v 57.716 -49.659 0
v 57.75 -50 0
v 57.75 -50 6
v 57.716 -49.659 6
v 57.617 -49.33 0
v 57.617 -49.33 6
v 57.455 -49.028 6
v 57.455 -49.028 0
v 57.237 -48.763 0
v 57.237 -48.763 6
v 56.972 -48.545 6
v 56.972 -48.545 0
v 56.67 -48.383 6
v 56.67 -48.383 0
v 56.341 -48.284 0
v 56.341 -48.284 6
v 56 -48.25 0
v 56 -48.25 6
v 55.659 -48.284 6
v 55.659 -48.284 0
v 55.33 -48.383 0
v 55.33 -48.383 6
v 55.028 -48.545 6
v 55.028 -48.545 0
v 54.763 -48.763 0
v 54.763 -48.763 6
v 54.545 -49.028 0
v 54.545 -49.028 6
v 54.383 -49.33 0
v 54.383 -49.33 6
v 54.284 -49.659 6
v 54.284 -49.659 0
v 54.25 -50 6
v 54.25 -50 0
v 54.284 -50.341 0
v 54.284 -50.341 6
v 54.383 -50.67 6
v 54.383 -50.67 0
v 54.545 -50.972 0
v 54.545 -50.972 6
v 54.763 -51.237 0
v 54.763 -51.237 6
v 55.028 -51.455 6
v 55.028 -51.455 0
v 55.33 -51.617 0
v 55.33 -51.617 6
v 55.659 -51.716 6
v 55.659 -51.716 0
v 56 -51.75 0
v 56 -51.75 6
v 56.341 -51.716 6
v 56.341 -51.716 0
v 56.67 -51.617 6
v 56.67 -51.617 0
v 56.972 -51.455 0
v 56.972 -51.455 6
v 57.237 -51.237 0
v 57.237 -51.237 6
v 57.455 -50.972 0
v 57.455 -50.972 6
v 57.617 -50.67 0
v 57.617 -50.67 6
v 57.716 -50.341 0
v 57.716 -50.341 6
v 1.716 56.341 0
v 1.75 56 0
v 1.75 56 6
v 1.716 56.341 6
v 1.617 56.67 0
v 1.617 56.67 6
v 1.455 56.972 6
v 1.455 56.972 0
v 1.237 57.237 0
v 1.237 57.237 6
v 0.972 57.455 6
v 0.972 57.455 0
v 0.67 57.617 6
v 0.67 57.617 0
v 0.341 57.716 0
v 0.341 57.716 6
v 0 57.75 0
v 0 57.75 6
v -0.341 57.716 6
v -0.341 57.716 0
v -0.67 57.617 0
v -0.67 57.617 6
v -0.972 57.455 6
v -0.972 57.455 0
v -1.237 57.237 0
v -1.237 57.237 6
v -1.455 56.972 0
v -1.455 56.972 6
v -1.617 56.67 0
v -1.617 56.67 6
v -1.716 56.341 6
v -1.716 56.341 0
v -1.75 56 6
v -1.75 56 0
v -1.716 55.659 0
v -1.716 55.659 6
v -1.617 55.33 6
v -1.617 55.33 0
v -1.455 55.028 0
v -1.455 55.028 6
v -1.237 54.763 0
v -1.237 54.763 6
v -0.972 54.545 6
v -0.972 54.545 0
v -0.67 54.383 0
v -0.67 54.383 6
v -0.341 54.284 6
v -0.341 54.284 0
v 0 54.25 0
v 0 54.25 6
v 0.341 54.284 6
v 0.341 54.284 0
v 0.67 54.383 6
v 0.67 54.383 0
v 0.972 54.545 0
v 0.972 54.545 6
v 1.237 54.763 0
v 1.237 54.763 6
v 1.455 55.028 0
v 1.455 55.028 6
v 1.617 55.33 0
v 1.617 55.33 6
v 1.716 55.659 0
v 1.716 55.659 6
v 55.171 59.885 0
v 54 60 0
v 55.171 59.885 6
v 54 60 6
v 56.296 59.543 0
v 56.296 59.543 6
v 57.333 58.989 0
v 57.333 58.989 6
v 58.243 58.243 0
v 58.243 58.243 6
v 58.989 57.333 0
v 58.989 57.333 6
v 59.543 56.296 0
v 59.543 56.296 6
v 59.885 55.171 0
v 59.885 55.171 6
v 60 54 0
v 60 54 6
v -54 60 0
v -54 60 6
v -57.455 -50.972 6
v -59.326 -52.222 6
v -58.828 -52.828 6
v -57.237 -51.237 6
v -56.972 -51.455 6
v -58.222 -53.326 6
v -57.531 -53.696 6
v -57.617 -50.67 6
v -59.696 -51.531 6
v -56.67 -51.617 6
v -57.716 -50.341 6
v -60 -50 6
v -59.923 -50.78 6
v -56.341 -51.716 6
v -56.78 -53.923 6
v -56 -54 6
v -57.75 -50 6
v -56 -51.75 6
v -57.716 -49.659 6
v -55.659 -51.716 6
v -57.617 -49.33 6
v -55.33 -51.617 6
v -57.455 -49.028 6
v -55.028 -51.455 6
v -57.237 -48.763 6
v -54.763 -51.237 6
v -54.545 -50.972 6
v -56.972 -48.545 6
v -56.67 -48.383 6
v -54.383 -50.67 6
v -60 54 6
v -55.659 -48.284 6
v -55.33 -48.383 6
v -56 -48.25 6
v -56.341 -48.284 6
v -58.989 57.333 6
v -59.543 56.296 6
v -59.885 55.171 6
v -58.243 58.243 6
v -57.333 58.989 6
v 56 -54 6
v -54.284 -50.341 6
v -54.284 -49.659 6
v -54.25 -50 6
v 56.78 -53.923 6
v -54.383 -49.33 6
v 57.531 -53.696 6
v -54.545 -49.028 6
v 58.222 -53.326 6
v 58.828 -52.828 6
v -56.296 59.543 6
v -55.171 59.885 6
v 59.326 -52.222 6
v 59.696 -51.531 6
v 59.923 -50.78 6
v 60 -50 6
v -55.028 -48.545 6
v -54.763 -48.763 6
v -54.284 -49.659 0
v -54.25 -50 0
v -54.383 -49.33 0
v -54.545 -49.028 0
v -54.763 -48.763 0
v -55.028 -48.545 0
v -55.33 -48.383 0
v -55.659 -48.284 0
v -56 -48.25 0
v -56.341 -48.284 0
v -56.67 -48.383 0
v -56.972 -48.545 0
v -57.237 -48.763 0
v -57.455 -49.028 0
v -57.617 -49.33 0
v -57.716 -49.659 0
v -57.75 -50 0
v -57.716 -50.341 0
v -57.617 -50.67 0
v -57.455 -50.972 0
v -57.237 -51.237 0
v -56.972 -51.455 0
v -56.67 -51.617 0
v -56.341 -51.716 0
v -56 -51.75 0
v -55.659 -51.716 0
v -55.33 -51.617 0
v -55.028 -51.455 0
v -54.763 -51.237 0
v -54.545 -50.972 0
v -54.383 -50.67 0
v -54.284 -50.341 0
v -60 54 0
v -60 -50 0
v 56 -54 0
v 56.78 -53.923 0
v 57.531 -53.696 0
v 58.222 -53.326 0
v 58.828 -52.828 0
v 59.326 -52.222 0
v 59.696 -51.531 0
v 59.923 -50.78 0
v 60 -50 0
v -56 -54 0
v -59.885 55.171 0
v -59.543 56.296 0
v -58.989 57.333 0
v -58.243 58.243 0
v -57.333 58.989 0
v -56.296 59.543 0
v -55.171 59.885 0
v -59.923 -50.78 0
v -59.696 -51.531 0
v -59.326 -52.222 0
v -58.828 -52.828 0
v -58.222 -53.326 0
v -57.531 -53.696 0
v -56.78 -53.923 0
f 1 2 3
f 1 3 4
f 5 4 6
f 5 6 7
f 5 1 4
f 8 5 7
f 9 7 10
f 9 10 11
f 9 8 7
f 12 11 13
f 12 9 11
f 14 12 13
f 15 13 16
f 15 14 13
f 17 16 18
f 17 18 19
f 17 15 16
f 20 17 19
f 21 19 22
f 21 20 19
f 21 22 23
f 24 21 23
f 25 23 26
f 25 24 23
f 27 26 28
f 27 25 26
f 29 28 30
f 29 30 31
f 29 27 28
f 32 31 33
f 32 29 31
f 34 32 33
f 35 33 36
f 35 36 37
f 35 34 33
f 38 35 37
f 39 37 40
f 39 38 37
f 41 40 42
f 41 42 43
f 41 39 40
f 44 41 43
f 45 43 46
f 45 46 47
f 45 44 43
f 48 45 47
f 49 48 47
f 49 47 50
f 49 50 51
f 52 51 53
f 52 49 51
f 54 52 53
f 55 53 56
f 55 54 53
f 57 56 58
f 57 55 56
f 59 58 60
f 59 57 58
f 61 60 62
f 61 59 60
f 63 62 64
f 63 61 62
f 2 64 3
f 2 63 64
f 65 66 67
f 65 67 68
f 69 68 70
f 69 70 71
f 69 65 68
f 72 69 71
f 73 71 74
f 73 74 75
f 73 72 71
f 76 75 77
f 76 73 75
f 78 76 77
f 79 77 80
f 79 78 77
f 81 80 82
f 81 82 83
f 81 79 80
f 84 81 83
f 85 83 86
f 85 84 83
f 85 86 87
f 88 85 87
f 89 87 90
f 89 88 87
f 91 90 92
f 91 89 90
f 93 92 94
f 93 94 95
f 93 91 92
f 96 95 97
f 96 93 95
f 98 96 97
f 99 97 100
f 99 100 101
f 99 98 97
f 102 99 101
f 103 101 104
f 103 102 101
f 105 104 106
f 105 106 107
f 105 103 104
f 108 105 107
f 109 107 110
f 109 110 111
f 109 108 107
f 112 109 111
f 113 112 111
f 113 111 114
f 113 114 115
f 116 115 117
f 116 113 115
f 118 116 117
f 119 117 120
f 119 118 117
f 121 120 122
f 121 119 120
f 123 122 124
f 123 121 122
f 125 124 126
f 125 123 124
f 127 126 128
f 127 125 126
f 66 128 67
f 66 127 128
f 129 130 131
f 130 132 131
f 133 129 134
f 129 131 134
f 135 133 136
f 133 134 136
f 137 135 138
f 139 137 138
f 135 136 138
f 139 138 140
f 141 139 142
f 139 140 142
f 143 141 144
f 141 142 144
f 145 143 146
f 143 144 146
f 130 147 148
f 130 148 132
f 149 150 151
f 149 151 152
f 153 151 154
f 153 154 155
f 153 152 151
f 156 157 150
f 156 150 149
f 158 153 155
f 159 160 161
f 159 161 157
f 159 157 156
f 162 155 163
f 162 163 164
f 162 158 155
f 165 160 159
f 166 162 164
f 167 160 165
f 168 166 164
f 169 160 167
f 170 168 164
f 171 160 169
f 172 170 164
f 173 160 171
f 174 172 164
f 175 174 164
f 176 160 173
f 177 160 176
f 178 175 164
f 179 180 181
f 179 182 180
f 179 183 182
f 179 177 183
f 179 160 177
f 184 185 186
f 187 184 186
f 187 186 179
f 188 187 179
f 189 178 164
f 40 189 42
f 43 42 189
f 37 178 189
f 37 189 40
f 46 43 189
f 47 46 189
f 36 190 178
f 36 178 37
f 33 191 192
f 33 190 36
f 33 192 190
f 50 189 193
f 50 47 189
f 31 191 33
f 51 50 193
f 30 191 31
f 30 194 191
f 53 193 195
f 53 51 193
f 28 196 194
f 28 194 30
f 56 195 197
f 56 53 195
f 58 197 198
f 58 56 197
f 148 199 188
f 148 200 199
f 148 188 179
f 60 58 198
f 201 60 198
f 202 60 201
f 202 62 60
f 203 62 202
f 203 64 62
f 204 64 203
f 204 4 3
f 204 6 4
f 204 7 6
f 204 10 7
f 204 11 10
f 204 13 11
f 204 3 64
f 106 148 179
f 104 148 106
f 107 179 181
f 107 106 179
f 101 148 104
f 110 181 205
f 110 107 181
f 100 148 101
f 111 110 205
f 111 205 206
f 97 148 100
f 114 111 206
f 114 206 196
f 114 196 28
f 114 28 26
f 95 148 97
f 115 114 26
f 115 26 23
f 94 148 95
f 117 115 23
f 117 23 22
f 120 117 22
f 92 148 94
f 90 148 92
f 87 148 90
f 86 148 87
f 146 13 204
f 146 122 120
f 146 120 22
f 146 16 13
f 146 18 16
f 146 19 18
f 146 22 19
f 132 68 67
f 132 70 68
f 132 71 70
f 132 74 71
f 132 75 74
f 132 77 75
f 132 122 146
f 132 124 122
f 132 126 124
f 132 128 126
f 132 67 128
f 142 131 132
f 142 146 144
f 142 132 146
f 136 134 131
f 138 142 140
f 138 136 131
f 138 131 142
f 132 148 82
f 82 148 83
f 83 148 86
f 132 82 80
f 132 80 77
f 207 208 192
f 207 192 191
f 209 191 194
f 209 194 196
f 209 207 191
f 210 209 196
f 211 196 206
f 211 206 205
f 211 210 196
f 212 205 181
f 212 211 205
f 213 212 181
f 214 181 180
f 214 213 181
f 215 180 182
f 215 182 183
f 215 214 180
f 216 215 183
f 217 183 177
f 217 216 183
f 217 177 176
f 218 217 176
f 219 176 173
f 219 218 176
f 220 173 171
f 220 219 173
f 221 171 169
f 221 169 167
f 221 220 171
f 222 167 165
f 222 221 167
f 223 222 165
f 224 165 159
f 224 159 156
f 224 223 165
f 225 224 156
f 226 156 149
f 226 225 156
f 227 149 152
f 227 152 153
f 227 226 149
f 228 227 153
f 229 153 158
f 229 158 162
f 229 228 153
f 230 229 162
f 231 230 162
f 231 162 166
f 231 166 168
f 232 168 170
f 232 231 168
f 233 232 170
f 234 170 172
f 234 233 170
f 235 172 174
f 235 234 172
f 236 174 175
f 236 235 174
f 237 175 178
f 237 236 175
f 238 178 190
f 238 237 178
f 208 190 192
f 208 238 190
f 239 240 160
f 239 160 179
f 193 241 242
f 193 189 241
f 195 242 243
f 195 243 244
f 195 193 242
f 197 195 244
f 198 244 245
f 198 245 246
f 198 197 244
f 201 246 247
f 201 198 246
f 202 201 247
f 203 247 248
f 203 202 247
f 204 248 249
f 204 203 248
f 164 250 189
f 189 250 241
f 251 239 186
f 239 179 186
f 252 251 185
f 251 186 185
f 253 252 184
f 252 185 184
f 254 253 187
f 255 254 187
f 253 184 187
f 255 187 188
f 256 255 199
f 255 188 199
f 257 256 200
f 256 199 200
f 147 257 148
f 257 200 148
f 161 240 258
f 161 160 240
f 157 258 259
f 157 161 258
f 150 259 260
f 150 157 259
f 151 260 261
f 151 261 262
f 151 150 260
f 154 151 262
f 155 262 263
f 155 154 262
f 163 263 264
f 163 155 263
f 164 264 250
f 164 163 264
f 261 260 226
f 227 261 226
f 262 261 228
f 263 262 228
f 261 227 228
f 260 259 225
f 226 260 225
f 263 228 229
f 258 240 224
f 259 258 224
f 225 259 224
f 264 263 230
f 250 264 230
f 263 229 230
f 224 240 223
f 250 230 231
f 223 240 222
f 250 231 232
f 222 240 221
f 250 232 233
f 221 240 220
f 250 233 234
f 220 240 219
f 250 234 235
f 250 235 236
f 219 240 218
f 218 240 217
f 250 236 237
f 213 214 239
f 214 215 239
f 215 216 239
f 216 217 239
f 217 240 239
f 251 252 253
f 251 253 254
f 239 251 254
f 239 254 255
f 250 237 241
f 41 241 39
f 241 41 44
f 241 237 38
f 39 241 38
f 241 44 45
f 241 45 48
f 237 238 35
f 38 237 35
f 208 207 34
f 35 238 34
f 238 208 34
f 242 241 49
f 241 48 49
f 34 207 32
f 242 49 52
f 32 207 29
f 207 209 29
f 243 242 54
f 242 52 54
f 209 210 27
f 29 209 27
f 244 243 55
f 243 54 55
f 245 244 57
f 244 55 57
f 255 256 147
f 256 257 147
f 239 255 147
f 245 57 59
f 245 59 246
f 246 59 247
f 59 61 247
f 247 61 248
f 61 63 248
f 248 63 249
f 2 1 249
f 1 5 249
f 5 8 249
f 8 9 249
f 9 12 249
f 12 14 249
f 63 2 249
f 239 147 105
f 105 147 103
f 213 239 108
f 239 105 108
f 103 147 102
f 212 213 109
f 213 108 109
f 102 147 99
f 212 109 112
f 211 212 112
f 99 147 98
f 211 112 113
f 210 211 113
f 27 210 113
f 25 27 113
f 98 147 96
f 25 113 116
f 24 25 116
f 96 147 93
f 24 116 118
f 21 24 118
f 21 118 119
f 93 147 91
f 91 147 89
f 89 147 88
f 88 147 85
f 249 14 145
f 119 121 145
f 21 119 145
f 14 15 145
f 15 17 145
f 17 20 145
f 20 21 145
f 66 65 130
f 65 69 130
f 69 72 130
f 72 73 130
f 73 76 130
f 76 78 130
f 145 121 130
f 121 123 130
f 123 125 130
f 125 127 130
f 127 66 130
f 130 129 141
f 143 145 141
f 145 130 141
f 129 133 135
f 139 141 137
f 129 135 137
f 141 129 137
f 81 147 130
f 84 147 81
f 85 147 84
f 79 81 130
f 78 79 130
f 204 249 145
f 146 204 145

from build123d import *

# Parameters (mm, degrees)
F0_W     = 120
F0_H     = 114
F0_R     = 1.75
F1_DEPTH = 6
F2_R     = 6
F3_R     = 4


with BuildPart() as f1:
    # F0 (on Top) → F1 (new body)
    with BuildSketch(Plane.XY):
        with Locations((0, 3)):
            Rectangle(F0_W, F0_H)
        with Locations((-56, -50)):
            Circle(F0_R, mode=Mode.SUBTRACT)
        with Locations((56, -50)):
            Circle(F0_R, mode=Mode.SUBTRACT)
        with Locations((0, 56)):
            Circle(F0_R, mode=Mode.SUBTRACT)
    extrude(amount=F1_DEPTH)

    # F2
    f2_edges = [f1.edges().sort_by_distance(p)[0] for p in [
        (-60, 60, 3),
        (60, 60, 3),
    ]]
    fillet(f2_edges, radius=F2_R)

    # F3
    f3_edges = [f1.edges().sort_by_distance(p)[0] for p in [
        (-60, -54, 3),
        (60, -54, 3),
    ]]
    fillet(f3_edges, radius=F3_R)


solid = f1.part
